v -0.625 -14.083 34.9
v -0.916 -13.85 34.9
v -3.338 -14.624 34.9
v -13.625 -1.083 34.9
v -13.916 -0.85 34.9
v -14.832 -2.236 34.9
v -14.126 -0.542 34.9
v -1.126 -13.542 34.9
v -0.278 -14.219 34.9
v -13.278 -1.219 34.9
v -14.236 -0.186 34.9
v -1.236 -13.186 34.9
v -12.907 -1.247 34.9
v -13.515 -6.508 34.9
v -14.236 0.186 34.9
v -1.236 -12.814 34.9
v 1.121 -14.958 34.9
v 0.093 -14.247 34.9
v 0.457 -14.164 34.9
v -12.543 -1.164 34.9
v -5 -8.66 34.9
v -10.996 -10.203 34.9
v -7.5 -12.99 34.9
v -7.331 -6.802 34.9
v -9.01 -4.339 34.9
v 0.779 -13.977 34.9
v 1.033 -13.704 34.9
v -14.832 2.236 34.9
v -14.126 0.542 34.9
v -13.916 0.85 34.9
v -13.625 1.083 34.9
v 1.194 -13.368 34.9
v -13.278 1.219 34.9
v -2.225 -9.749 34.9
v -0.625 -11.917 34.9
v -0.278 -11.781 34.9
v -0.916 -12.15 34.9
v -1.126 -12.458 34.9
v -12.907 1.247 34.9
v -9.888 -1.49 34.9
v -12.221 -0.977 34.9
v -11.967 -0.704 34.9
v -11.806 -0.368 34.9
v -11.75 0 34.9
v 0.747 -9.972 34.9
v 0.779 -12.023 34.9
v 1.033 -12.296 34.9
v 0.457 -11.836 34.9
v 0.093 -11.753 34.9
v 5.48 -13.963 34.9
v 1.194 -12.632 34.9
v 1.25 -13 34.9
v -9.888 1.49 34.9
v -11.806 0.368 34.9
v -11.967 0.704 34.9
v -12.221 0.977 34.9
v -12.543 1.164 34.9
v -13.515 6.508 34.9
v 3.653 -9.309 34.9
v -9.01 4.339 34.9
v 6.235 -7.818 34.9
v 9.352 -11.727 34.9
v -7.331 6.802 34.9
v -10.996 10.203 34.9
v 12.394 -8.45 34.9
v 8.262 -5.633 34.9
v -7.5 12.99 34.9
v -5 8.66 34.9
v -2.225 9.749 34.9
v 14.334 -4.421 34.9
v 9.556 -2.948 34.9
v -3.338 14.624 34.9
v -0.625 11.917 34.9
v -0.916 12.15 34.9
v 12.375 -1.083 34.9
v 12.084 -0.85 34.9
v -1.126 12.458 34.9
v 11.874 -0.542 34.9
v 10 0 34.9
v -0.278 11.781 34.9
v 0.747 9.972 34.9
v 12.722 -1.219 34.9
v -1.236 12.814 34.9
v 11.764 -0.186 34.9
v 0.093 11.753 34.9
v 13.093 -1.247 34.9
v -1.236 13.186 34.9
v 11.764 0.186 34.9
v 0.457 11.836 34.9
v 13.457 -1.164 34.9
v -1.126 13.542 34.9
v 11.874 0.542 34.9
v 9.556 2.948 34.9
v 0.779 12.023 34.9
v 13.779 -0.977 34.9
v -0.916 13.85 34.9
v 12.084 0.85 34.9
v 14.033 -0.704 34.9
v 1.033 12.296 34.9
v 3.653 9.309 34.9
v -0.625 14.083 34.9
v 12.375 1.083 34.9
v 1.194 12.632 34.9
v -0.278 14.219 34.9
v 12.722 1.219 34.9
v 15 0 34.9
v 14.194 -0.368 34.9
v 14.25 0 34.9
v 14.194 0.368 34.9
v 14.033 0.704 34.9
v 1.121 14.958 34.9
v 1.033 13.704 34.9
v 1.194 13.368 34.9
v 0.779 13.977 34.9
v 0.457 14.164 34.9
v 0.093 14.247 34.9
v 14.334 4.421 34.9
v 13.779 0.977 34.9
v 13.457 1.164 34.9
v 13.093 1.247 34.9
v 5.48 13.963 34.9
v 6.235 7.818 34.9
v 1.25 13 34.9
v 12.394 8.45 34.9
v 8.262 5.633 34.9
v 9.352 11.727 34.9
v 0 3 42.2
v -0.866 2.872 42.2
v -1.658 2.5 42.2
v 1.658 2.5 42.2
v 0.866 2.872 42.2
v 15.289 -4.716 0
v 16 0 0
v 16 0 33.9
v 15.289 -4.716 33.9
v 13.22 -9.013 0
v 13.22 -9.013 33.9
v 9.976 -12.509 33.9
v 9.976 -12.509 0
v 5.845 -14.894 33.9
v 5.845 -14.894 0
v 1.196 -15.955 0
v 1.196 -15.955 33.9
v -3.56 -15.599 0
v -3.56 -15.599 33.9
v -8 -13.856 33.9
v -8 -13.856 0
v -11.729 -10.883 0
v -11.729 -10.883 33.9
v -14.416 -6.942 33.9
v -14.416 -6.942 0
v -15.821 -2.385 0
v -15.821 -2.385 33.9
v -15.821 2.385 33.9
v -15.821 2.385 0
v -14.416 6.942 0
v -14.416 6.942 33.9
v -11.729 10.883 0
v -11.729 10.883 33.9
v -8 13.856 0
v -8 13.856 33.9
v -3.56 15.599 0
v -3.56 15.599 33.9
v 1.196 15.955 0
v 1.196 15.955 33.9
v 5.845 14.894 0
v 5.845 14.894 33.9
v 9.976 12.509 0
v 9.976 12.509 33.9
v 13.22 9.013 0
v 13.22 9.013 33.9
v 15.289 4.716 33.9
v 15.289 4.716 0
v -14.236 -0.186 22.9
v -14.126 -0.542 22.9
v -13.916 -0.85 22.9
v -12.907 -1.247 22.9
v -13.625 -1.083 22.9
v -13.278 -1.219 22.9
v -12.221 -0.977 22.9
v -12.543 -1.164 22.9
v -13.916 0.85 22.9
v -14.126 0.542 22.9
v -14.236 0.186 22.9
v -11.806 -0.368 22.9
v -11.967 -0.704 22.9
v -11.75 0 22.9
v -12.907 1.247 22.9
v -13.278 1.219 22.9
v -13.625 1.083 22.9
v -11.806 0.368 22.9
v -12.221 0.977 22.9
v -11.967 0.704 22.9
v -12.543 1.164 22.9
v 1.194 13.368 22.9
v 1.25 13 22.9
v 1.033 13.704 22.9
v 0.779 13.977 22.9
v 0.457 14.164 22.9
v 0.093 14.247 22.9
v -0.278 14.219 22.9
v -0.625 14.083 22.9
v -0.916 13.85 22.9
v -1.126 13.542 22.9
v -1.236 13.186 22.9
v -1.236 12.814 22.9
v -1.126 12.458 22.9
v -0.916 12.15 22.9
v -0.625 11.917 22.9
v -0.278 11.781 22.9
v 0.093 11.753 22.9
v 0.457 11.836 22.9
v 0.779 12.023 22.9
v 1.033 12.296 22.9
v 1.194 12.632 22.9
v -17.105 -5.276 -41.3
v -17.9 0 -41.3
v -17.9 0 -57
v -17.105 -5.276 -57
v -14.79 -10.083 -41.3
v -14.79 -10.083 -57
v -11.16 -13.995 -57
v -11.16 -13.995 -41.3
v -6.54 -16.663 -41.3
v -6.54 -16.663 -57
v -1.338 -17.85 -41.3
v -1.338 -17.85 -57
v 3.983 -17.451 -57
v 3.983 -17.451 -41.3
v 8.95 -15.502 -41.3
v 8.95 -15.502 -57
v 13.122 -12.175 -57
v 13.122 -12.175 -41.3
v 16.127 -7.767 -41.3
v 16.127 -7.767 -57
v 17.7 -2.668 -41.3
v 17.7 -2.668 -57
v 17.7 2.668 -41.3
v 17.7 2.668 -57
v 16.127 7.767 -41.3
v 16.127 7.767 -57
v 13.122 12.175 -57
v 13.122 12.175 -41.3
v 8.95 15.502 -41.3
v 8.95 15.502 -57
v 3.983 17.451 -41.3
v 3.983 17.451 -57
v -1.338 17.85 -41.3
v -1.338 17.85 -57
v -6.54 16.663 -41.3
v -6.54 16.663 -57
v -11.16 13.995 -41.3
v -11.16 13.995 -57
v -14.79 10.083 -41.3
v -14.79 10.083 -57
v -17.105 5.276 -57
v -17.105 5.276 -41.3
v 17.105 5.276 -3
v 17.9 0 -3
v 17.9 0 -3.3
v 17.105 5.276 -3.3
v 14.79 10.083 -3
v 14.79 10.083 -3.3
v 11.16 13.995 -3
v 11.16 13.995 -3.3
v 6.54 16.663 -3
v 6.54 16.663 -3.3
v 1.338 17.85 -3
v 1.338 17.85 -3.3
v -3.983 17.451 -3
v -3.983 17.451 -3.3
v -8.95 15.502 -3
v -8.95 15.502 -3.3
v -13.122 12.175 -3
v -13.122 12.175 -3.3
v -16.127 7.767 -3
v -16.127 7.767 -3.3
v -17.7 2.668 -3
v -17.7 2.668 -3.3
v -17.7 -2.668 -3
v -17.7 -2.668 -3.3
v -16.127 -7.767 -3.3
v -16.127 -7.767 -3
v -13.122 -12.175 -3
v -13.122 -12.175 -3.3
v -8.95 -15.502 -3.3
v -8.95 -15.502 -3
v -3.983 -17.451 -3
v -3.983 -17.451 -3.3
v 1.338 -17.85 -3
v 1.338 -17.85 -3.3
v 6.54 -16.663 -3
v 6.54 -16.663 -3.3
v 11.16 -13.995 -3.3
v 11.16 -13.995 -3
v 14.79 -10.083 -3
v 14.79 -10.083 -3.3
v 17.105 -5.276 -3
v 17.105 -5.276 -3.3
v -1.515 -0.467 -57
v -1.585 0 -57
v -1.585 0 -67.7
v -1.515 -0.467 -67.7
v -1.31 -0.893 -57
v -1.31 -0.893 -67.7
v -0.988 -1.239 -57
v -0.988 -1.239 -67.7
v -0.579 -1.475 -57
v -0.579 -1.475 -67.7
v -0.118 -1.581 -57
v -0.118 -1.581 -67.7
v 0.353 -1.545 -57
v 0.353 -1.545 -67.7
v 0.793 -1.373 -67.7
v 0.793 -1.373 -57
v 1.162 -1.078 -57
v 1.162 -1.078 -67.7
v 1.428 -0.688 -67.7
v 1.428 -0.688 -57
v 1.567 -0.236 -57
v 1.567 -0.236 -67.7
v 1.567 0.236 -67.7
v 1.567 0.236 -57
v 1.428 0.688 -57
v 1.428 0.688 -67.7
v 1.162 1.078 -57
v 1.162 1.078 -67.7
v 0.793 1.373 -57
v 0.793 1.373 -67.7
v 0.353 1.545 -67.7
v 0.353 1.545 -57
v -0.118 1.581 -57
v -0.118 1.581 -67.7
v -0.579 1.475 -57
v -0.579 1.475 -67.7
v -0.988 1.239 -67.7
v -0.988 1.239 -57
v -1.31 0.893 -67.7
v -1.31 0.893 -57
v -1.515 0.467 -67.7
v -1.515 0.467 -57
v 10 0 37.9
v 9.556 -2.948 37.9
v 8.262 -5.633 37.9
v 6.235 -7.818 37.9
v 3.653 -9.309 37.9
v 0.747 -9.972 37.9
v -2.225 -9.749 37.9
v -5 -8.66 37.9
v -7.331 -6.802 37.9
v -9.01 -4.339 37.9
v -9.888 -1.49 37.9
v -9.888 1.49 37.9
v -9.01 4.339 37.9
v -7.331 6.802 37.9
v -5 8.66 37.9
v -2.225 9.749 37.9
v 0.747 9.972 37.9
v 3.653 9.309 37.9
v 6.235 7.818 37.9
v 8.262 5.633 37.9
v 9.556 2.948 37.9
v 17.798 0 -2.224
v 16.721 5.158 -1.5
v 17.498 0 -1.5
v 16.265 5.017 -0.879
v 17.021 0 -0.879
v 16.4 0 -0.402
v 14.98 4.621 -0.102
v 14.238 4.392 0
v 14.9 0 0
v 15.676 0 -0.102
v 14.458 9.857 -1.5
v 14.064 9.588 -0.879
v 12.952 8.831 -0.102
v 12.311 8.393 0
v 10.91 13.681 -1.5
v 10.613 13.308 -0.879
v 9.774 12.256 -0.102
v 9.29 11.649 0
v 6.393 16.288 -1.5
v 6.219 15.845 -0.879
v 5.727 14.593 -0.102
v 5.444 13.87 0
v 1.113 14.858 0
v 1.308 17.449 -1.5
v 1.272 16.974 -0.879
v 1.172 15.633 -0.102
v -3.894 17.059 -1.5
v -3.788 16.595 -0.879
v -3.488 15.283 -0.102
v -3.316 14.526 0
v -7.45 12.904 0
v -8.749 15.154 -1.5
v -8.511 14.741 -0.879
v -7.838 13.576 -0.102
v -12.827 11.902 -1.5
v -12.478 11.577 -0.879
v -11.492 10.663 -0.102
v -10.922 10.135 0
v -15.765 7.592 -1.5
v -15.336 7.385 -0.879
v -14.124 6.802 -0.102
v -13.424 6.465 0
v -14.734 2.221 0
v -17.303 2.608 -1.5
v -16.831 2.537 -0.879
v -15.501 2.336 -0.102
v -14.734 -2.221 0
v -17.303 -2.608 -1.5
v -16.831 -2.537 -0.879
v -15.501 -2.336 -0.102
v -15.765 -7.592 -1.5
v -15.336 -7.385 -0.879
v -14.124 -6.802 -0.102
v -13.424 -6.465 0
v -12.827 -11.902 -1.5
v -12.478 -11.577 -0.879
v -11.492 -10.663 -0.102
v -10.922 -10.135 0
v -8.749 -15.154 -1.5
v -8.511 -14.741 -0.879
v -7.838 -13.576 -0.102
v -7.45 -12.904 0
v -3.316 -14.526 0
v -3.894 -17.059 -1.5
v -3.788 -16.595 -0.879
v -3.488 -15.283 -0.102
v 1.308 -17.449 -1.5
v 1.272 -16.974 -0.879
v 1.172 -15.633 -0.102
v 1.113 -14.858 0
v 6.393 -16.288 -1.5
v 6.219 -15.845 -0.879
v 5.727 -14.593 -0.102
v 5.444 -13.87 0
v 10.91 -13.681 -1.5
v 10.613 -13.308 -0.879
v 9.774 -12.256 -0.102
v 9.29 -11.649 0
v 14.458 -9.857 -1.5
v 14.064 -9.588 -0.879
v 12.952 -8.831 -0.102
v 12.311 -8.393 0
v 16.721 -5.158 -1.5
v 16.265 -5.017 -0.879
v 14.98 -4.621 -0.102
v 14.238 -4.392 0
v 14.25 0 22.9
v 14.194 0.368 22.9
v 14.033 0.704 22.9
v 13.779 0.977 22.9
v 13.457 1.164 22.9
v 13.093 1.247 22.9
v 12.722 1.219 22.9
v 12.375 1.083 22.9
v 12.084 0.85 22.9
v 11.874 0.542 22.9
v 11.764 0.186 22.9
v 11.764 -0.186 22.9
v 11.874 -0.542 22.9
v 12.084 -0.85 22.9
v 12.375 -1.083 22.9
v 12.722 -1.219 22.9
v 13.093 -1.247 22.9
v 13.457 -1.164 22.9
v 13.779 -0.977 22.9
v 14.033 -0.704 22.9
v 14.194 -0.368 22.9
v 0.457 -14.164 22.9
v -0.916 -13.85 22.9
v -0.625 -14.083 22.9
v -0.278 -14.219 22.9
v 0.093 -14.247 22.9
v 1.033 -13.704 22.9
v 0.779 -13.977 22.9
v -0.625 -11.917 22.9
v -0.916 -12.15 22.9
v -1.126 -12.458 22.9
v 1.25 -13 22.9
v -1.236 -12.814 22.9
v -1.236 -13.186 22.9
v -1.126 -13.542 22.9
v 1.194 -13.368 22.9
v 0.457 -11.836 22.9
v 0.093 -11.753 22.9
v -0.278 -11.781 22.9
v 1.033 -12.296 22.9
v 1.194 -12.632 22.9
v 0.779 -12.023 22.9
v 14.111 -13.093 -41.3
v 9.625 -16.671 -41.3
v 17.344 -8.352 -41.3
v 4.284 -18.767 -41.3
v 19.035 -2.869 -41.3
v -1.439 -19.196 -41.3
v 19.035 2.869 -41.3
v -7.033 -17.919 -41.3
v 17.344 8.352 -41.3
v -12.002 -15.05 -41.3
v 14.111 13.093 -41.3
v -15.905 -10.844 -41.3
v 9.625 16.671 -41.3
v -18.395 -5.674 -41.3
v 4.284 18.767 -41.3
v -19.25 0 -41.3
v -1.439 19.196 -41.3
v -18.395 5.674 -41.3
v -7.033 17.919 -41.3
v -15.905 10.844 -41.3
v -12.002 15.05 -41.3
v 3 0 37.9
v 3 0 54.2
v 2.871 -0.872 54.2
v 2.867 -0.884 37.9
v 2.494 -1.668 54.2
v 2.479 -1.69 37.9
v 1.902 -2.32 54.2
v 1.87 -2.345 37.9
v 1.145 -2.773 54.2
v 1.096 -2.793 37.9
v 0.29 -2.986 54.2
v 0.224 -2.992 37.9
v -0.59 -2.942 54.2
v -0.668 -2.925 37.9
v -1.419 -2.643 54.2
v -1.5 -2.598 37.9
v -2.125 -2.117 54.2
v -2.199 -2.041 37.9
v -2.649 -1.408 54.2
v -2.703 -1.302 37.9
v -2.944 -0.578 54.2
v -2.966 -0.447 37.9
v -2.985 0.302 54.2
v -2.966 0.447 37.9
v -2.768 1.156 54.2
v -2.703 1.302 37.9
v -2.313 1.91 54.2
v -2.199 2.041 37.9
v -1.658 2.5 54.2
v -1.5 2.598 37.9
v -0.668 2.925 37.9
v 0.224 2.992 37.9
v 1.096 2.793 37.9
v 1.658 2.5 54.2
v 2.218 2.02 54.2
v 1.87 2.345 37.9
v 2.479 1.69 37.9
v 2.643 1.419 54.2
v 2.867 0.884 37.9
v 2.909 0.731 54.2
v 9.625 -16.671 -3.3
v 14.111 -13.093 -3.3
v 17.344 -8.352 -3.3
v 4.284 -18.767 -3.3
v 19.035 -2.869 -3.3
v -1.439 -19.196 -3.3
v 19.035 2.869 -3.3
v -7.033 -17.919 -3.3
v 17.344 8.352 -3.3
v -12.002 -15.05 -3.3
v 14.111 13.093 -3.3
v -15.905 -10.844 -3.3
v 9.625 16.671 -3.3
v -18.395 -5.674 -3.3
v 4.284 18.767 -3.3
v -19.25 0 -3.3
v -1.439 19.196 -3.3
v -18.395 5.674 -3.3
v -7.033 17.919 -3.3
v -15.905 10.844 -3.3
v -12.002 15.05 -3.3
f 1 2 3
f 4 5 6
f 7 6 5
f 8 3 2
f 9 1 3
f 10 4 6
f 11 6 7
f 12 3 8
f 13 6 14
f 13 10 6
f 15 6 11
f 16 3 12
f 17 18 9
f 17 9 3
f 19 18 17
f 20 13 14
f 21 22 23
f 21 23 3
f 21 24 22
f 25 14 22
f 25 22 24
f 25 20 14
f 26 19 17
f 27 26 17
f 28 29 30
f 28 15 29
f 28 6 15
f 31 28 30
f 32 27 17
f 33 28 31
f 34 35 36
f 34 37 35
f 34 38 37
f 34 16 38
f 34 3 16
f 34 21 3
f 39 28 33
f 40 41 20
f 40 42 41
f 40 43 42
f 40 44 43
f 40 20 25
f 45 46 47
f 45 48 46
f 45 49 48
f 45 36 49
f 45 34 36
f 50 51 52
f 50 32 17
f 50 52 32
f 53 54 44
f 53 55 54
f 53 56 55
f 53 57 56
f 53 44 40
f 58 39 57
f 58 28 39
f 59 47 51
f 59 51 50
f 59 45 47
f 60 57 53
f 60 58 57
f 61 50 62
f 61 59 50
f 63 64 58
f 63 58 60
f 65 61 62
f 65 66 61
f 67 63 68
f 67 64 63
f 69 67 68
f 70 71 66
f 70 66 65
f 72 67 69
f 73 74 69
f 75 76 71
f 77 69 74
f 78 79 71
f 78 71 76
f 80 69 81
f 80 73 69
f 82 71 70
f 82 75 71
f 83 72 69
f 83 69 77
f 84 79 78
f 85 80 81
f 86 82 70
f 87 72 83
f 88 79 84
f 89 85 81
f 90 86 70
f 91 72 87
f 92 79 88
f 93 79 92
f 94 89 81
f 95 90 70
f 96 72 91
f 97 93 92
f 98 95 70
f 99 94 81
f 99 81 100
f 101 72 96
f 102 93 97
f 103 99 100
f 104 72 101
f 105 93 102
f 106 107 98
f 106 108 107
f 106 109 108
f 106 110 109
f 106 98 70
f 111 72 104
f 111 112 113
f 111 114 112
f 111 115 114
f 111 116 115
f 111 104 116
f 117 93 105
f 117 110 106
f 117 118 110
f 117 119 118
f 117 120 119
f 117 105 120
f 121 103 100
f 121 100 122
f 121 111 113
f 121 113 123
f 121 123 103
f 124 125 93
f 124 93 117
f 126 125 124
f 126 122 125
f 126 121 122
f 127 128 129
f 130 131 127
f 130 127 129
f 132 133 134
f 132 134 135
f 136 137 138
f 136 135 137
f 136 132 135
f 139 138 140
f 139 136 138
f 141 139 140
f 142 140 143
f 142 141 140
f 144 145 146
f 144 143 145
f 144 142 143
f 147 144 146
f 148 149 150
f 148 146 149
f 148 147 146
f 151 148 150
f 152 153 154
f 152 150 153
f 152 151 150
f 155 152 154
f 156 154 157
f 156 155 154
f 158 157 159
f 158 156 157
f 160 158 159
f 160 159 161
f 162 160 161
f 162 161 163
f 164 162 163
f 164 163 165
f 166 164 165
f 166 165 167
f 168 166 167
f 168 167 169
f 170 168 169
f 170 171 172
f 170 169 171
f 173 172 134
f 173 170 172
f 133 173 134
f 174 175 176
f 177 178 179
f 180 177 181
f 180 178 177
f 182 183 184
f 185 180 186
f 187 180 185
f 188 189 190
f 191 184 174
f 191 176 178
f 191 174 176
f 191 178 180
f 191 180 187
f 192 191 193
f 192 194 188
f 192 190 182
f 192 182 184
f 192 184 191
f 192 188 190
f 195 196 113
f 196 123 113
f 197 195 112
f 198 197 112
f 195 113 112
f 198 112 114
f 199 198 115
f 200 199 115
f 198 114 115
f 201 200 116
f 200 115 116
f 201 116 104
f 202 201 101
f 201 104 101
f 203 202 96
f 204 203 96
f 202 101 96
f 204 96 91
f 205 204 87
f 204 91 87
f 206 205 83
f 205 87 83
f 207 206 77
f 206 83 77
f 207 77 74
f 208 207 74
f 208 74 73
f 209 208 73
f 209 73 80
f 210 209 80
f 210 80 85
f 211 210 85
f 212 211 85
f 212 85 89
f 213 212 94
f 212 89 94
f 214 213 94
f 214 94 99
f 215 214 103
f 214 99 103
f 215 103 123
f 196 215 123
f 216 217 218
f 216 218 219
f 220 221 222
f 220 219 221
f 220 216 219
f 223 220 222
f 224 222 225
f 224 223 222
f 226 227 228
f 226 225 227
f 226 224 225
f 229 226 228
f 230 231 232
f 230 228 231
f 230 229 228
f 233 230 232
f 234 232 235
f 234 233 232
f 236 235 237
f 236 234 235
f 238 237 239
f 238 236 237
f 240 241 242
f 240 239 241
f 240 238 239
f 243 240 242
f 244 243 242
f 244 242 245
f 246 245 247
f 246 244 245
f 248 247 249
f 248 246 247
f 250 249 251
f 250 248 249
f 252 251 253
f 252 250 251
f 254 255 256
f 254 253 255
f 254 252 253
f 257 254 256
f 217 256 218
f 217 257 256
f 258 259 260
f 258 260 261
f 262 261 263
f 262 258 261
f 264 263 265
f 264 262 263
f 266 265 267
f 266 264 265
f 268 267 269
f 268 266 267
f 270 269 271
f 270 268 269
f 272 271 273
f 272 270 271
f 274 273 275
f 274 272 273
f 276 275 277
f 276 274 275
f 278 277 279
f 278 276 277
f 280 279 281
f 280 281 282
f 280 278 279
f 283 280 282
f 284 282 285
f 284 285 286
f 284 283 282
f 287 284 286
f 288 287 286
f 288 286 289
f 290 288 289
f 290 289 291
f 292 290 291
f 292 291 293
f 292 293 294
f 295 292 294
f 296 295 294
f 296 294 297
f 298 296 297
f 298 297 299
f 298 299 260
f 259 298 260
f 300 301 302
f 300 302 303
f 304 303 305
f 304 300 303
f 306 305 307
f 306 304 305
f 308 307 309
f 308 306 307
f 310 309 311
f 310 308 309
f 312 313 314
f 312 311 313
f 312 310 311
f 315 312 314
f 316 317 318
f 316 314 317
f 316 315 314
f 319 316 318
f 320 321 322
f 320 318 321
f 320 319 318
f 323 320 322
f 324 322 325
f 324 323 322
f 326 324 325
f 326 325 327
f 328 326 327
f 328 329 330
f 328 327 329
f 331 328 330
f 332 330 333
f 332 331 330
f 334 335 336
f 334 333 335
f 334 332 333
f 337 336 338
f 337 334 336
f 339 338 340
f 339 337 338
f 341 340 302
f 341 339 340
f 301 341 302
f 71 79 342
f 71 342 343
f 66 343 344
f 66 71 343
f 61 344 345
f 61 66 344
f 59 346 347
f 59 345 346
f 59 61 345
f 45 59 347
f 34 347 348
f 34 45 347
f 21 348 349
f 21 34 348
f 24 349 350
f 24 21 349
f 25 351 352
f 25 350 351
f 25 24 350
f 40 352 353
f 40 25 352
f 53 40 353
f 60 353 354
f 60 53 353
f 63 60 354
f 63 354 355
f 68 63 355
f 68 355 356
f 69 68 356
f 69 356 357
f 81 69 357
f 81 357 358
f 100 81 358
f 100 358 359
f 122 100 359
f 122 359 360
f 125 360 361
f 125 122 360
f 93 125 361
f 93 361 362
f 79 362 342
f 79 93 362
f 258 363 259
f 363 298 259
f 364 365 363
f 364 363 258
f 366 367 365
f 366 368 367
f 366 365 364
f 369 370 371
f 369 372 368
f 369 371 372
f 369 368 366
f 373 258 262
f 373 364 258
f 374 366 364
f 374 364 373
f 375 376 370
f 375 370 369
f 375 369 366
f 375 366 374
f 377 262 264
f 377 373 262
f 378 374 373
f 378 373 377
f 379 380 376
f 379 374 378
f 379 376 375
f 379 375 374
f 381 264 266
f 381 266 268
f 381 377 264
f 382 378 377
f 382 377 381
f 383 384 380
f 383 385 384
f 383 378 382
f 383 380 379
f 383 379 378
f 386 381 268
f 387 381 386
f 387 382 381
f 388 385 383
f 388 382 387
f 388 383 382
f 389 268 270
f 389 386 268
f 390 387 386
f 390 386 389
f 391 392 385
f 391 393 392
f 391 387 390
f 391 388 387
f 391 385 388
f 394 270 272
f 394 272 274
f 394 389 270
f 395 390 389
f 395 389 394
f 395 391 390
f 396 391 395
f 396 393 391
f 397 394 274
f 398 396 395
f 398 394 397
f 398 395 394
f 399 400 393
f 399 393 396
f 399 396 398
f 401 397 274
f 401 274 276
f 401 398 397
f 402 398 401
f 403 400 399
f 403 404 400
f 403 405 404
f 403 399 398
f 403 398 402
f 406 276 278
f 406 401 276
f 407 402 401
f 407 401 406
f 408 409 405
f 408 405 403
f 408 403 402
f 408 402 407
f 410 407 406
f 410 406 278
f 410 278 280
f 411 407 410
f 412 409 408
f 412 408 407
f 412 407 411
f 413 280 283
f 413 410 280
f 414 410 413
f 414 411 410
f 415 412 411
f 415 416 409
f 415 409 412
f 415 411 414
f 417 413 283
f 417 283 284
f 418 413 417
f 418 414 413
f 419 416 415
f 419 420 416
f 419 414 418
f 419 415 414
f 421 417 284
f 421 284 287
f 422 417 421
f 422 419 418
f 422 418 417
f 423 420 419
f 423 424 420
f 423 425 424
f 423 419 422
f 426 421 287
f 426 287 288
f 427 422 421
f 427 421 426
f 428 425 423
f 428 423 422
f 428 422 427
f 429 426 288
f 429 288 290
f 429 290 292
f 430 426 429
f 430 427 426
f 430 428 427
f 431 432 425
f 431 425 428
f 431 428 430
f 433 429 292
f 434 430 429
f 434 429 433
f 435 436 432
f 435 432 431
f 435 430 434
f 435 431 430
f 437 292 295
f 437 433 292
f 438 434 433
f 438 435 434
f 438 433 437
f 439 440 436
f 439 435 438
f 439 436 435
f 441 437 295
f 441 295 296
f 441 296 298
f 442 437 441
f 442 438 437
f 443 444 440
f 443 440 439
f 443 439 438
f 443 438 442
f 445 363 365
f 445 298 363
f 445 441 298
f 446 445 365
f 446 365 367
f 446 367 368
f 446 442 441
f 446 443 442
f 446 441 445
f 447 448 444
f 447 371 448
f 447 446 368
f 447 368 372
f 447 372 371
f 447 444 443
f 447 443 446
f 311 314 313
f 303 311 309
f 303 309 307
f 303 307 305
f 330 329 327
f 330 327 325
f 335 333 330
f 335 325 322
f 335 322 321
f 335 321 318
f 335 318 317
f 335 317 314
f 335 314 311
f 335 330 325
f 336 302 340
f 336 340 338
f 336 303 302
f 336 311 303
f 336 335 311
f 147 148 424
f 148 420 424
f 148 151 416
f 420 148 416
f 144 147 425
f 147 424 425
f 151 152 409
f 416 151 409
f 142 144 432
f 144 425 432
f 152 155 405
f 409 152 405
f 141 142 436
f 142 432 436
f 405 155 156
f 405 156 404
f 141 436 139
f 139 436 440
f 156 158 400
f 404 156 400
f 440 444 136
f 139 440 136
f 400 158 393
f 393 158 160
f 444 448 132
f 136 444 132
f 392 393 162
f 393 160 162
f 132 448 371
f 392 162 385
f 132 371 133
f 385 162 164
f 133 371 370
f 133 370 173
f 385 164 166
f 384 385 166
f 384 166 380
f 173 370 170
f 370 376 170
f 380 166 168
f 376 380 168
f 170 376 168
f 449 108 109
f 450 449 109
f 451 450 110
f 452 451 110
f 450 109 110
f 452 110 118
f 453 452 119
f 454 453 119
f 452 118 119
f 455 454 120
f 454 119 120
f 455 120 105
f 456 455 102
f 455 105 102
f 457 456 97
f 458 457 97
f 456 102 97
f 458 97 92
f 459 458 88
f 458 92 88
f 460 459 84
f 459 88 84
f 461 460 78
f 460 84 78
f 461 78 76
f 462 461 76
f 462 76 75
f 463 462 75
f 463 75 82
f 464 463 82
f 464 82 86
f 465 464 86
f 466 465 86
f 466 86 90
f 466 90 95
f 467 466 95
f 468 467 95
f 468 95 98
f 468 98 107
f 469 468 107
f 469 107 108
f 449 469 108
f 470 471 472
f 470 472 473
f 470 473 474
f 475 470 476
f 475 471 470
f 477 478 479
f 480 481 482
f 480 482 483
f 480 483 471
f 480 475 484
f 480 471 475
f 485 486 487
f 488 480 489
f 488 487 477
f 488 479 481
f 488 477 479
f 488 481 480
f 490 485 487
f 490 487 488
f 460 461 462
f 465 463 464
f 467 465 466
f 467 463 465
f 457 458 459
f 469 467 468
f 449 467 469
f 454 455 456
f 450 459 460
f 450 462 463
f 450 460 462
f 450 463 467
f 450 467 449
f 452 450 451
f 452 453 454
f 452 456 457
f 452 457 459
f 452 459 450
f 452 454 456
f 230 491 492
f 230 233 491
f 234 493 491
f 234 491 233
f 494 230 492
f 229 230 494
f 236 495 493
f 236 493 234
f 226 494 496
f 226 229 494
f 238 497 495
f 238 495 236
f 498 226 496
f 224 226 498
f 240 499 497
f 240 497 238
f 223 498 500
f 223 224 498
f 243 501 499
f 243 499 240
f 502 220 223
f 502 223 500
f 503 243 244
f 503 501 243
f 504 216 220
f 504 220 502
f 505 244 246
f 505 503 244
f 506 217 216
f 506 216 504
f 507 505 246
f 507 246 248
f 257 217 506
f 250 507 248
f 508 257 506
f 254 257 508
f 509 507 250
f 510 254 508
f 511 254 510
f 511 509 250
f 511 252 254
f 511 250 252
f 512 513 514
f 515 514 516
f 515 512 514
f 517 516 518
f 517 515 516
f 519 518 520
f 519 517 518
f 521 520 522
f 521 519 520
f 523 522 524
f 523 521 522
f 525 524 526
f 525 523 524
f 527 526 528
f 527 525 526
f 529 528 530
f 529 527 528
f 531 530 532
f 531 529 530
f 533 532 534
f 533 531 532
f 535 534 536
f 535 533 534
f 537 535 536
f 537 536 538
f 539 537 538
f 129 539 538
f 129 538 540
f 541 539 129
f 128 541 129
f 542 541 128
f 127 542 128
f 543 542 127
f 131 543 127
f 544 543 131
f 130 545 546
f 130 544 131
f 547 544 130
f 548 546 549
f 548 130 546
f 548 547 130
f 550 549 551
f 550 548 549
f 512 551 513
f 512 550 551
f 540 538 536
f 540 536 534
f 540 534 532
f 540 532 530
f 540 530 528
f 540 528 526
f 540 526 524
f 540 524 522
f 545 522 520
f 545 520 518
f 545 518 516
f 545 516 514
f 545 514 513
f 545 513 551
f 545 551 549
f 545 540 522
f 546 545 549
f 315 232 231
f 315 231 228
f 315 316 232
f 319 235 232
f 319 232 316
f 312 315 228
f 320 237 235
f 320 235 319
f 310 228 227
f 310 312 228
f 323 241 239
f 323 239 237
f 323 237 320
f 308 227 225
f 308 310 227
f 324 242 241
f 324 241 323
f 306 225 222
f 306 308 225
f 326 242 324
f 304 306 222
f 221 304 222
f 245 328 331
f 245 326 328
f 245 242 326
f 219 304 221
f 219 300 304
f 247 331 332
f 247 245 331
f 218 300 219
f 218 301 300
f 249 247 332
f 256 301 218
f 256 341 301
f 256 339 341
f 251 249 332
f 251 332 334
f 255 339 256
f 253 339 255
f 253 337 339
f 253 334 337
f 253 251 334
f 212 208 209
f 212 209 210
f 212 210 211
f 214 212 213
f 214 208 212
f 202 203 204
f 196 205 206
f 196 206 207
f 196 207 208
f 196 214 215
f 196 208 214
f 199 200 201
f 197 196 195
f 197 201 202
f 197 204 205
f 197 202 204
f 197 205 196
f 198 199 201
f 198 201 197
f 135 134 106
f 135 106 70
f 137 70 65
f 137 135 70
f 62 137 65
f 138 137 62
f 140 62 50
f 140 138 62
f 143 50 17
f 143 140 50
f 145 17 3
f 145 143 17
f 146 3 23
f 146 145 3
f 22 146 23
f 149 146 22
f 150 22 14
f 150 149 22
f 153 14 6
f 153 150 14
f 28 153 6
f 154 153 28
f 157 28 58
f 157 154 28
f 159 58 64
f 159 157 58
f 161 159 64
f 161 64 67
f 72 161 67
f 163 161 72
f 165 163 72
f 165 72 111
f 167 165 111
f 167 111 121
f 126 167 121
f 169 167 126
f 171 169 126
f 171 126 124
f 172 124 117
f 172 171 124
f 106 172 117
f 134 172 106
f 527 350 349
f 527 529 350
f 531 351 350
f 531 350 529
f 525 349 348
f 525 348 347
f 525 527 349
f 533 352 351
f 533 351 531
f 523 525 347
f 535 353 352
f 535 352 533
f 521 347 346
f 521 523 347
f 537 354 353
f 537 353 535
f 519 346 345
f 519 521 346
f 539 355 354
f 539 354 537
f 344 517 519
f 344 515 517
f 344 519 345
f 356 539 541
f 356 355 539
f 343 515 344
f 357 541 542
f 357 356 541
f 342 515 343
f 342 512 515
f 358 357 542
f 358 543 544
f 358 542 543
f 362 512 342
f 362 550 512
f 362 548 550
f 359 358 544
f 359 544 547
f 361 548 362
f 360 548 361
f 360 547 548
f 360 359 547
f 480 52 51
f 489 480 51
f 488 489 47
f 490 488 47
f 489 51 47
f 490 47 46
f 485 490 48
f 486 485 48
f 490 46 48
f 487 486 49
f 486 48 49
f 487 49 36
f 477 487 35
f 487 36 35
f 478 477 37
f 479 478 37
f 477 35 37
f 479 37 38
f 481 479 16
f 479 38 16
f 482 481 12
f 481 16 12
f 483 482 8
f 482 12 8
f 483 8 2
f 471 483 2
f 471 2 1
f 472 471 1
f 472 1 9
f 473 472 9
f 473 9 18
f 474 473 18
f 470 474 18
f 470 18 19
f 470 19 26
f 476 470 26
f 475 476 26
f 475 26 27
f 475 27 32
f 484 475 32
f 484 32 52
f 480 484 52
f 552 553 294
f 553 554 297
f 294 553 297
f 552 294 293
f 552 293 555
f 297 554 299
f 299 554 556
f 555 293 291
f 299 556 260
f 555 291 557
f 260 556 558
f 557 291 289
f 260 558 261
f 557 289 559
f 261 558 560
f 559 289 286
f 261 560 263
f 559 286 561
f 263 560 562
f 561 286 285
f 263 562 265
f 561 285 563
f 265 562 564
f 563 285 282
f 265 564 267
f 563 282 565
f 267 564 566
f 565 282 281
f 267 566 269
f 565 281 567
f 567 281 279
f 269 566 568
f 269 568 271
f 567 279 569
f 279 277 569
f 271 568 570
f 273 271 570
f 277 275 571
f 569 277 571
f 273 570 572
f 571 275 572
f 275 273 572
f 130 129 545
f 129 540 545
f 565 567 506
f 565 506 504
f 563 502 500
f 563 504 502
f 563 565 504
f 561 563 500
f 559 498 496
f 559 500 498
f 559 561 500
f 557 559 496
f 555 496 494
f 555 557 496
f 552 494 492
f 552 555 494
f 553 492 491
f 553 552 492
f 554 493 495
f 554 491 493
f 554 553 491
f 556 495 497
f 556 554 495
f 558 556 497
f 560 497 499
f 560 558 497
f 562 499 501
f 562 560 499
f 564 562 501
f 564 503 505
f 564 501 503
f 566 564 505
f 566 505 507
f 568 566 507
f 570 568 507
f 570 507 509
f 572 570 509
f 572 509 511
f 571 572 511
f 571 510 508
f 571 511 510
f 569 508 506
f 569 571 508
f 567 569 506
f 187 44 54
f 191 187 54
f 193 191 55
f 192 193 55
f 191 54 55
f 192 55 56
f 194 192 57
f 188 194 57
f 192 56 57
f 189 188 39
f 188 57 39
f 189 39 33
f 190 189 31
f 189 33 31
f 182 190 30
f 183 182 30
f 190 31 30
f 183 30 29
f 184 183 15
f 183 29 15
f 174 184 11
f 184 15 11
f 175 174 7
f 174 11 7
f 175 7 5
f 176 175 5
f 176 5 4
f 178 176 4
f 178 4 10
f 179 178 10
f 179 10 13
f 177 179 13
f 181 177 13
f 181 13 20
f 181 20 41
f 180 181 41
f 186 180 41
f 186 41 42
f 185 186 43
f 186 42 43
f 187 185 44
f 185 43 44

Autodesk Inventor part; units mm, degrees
ref_plane "YZ Plane" through (0, 0, 0) normal (1, 0, 0) x (0, 1, 0)
ref_plane "XZ Plane" through (0, 0, 0) normal (0, 1, 0) x (-1, 0, 0)
ref_plane "XY Plane" through (0, 0, 0) normal (0, 0, 1) x (1, 0, 0)
sketch "スケッチ1" plane through (0, 0, 0) normal (0, 0, 1) x (1, 0, 0)
  circle A0 centre (0, 0) radius 17.9
  dimension "d0" = 35.8
extrude "押し出し1" add sketch "スケッチ1" against normal blind 3.3
fillet "フィレット1" radius 3 1 edges at (-17.9, 0, 0)
sketch "スケッチ2" plane through (0, 0, -3.3) normal (0, 0, -1) x (-1, 0, 0)
  circle A0 centre (0, 0) radius 19.25
  dimension "d4" = 38.5
extrude "押し出し2" add sketch "スケッチ2" along normal blind 38
sketch "スケッチ3" plane through (0, 0, -41.3) normal (0, 0, -1) x (-1, 0, 0)
  circle A0 centre (0, 0) radius 17.9
  dimension "d7" = 35.8
extrude "押し出し3" add sketch "スケッチ3" along normal blind 15.7
sketch "スケッチ4" plane through (0, 0, -57) normal (0, 0, -1) x (-1, 0, 0)
  circle A0 centre (0, 0) radius 1.585
  dimension "d10" = 3.17
extrude "押し出し4" add sketch "スケッチ4" along normal blind 10.7
sketch "スケッチ5" plane through (0, 0, 0) normal (0, 0, 1) x (1, 0, 0)
  circle A0 centre (0, 0) radius 1.585 projected
  circle A1 centre (0, 0) radius 16
  dimension "d13" = 32
extrude "押し出し5" add sketch "スケッチ5" along normal blind 34.9 contours A0 | A1
chamfer "面取り1" distance 1 angle 45 1 edges at (-16, 0, 34.9)
sketch "スケッチ6" plane through (0, 0, 34.9) normal (0, 0, 1) x (1, 0, 0)
  circle A0 centre (0, 0) radius 10
  dimension "d19" = 20
extrude "押し出し6" add sketch "スケッチ6" along normal blind 3
sketch "スケッチ7" plane through (0, 0, 37.9) normal (0, 0, 1) x (1, 0, 0)
  circle A0 centre (0, 0) radius 1.585 projected
  circle A1 centre (0, 0) radius 3
  dimension "d22" = 6
extrude "押し出し7" add sketch "スケッチ7" along normal blind 16.3 contours A0 | A1
sketch "スケッチ8" plane through (0, 0, 54.2) normal (0, 0, 1) x (1, 0, 0)
  circle A0 centre (0, 0) radius 3 projected
  line L0 (-1.6583, 2.5) -> (1.6583, 2.5)
  arc A1 (1.6583, 2.5) -> (-1.6583, 2.5) centre (0, 0) ccw
  dimension "d25" = 2.5
extrude "押し出し8" cut sketch "スケッチ8" against normal blind 12 contours L0 A0 picked at (-0.1169, 2.6598)
sketch "スケッチ9" plane through (0, 0, 34.9) normal (0, 0, 1) x (1, 0, 0)
  circle A0 centre (0, 13) radius 1.25
  circle A1 centre (-13, 0) radius 1.25
  circle A2 centre (0, -13) radius 1.25
  circle A3 centre (13, 0) radius 1.25
  circle A4 centre (0, 0) radius 13 construction
  dimension "d28" = 2.5
  dimension "d29" = 2.5
  dimension "d30" = 2.5
  dimension "d31" = 2.5
  dimension "d32" = 26
extrude "押し出し9" cut sketch "スケッチ9" against normal blind 12
properties part number "RS-555-71"
